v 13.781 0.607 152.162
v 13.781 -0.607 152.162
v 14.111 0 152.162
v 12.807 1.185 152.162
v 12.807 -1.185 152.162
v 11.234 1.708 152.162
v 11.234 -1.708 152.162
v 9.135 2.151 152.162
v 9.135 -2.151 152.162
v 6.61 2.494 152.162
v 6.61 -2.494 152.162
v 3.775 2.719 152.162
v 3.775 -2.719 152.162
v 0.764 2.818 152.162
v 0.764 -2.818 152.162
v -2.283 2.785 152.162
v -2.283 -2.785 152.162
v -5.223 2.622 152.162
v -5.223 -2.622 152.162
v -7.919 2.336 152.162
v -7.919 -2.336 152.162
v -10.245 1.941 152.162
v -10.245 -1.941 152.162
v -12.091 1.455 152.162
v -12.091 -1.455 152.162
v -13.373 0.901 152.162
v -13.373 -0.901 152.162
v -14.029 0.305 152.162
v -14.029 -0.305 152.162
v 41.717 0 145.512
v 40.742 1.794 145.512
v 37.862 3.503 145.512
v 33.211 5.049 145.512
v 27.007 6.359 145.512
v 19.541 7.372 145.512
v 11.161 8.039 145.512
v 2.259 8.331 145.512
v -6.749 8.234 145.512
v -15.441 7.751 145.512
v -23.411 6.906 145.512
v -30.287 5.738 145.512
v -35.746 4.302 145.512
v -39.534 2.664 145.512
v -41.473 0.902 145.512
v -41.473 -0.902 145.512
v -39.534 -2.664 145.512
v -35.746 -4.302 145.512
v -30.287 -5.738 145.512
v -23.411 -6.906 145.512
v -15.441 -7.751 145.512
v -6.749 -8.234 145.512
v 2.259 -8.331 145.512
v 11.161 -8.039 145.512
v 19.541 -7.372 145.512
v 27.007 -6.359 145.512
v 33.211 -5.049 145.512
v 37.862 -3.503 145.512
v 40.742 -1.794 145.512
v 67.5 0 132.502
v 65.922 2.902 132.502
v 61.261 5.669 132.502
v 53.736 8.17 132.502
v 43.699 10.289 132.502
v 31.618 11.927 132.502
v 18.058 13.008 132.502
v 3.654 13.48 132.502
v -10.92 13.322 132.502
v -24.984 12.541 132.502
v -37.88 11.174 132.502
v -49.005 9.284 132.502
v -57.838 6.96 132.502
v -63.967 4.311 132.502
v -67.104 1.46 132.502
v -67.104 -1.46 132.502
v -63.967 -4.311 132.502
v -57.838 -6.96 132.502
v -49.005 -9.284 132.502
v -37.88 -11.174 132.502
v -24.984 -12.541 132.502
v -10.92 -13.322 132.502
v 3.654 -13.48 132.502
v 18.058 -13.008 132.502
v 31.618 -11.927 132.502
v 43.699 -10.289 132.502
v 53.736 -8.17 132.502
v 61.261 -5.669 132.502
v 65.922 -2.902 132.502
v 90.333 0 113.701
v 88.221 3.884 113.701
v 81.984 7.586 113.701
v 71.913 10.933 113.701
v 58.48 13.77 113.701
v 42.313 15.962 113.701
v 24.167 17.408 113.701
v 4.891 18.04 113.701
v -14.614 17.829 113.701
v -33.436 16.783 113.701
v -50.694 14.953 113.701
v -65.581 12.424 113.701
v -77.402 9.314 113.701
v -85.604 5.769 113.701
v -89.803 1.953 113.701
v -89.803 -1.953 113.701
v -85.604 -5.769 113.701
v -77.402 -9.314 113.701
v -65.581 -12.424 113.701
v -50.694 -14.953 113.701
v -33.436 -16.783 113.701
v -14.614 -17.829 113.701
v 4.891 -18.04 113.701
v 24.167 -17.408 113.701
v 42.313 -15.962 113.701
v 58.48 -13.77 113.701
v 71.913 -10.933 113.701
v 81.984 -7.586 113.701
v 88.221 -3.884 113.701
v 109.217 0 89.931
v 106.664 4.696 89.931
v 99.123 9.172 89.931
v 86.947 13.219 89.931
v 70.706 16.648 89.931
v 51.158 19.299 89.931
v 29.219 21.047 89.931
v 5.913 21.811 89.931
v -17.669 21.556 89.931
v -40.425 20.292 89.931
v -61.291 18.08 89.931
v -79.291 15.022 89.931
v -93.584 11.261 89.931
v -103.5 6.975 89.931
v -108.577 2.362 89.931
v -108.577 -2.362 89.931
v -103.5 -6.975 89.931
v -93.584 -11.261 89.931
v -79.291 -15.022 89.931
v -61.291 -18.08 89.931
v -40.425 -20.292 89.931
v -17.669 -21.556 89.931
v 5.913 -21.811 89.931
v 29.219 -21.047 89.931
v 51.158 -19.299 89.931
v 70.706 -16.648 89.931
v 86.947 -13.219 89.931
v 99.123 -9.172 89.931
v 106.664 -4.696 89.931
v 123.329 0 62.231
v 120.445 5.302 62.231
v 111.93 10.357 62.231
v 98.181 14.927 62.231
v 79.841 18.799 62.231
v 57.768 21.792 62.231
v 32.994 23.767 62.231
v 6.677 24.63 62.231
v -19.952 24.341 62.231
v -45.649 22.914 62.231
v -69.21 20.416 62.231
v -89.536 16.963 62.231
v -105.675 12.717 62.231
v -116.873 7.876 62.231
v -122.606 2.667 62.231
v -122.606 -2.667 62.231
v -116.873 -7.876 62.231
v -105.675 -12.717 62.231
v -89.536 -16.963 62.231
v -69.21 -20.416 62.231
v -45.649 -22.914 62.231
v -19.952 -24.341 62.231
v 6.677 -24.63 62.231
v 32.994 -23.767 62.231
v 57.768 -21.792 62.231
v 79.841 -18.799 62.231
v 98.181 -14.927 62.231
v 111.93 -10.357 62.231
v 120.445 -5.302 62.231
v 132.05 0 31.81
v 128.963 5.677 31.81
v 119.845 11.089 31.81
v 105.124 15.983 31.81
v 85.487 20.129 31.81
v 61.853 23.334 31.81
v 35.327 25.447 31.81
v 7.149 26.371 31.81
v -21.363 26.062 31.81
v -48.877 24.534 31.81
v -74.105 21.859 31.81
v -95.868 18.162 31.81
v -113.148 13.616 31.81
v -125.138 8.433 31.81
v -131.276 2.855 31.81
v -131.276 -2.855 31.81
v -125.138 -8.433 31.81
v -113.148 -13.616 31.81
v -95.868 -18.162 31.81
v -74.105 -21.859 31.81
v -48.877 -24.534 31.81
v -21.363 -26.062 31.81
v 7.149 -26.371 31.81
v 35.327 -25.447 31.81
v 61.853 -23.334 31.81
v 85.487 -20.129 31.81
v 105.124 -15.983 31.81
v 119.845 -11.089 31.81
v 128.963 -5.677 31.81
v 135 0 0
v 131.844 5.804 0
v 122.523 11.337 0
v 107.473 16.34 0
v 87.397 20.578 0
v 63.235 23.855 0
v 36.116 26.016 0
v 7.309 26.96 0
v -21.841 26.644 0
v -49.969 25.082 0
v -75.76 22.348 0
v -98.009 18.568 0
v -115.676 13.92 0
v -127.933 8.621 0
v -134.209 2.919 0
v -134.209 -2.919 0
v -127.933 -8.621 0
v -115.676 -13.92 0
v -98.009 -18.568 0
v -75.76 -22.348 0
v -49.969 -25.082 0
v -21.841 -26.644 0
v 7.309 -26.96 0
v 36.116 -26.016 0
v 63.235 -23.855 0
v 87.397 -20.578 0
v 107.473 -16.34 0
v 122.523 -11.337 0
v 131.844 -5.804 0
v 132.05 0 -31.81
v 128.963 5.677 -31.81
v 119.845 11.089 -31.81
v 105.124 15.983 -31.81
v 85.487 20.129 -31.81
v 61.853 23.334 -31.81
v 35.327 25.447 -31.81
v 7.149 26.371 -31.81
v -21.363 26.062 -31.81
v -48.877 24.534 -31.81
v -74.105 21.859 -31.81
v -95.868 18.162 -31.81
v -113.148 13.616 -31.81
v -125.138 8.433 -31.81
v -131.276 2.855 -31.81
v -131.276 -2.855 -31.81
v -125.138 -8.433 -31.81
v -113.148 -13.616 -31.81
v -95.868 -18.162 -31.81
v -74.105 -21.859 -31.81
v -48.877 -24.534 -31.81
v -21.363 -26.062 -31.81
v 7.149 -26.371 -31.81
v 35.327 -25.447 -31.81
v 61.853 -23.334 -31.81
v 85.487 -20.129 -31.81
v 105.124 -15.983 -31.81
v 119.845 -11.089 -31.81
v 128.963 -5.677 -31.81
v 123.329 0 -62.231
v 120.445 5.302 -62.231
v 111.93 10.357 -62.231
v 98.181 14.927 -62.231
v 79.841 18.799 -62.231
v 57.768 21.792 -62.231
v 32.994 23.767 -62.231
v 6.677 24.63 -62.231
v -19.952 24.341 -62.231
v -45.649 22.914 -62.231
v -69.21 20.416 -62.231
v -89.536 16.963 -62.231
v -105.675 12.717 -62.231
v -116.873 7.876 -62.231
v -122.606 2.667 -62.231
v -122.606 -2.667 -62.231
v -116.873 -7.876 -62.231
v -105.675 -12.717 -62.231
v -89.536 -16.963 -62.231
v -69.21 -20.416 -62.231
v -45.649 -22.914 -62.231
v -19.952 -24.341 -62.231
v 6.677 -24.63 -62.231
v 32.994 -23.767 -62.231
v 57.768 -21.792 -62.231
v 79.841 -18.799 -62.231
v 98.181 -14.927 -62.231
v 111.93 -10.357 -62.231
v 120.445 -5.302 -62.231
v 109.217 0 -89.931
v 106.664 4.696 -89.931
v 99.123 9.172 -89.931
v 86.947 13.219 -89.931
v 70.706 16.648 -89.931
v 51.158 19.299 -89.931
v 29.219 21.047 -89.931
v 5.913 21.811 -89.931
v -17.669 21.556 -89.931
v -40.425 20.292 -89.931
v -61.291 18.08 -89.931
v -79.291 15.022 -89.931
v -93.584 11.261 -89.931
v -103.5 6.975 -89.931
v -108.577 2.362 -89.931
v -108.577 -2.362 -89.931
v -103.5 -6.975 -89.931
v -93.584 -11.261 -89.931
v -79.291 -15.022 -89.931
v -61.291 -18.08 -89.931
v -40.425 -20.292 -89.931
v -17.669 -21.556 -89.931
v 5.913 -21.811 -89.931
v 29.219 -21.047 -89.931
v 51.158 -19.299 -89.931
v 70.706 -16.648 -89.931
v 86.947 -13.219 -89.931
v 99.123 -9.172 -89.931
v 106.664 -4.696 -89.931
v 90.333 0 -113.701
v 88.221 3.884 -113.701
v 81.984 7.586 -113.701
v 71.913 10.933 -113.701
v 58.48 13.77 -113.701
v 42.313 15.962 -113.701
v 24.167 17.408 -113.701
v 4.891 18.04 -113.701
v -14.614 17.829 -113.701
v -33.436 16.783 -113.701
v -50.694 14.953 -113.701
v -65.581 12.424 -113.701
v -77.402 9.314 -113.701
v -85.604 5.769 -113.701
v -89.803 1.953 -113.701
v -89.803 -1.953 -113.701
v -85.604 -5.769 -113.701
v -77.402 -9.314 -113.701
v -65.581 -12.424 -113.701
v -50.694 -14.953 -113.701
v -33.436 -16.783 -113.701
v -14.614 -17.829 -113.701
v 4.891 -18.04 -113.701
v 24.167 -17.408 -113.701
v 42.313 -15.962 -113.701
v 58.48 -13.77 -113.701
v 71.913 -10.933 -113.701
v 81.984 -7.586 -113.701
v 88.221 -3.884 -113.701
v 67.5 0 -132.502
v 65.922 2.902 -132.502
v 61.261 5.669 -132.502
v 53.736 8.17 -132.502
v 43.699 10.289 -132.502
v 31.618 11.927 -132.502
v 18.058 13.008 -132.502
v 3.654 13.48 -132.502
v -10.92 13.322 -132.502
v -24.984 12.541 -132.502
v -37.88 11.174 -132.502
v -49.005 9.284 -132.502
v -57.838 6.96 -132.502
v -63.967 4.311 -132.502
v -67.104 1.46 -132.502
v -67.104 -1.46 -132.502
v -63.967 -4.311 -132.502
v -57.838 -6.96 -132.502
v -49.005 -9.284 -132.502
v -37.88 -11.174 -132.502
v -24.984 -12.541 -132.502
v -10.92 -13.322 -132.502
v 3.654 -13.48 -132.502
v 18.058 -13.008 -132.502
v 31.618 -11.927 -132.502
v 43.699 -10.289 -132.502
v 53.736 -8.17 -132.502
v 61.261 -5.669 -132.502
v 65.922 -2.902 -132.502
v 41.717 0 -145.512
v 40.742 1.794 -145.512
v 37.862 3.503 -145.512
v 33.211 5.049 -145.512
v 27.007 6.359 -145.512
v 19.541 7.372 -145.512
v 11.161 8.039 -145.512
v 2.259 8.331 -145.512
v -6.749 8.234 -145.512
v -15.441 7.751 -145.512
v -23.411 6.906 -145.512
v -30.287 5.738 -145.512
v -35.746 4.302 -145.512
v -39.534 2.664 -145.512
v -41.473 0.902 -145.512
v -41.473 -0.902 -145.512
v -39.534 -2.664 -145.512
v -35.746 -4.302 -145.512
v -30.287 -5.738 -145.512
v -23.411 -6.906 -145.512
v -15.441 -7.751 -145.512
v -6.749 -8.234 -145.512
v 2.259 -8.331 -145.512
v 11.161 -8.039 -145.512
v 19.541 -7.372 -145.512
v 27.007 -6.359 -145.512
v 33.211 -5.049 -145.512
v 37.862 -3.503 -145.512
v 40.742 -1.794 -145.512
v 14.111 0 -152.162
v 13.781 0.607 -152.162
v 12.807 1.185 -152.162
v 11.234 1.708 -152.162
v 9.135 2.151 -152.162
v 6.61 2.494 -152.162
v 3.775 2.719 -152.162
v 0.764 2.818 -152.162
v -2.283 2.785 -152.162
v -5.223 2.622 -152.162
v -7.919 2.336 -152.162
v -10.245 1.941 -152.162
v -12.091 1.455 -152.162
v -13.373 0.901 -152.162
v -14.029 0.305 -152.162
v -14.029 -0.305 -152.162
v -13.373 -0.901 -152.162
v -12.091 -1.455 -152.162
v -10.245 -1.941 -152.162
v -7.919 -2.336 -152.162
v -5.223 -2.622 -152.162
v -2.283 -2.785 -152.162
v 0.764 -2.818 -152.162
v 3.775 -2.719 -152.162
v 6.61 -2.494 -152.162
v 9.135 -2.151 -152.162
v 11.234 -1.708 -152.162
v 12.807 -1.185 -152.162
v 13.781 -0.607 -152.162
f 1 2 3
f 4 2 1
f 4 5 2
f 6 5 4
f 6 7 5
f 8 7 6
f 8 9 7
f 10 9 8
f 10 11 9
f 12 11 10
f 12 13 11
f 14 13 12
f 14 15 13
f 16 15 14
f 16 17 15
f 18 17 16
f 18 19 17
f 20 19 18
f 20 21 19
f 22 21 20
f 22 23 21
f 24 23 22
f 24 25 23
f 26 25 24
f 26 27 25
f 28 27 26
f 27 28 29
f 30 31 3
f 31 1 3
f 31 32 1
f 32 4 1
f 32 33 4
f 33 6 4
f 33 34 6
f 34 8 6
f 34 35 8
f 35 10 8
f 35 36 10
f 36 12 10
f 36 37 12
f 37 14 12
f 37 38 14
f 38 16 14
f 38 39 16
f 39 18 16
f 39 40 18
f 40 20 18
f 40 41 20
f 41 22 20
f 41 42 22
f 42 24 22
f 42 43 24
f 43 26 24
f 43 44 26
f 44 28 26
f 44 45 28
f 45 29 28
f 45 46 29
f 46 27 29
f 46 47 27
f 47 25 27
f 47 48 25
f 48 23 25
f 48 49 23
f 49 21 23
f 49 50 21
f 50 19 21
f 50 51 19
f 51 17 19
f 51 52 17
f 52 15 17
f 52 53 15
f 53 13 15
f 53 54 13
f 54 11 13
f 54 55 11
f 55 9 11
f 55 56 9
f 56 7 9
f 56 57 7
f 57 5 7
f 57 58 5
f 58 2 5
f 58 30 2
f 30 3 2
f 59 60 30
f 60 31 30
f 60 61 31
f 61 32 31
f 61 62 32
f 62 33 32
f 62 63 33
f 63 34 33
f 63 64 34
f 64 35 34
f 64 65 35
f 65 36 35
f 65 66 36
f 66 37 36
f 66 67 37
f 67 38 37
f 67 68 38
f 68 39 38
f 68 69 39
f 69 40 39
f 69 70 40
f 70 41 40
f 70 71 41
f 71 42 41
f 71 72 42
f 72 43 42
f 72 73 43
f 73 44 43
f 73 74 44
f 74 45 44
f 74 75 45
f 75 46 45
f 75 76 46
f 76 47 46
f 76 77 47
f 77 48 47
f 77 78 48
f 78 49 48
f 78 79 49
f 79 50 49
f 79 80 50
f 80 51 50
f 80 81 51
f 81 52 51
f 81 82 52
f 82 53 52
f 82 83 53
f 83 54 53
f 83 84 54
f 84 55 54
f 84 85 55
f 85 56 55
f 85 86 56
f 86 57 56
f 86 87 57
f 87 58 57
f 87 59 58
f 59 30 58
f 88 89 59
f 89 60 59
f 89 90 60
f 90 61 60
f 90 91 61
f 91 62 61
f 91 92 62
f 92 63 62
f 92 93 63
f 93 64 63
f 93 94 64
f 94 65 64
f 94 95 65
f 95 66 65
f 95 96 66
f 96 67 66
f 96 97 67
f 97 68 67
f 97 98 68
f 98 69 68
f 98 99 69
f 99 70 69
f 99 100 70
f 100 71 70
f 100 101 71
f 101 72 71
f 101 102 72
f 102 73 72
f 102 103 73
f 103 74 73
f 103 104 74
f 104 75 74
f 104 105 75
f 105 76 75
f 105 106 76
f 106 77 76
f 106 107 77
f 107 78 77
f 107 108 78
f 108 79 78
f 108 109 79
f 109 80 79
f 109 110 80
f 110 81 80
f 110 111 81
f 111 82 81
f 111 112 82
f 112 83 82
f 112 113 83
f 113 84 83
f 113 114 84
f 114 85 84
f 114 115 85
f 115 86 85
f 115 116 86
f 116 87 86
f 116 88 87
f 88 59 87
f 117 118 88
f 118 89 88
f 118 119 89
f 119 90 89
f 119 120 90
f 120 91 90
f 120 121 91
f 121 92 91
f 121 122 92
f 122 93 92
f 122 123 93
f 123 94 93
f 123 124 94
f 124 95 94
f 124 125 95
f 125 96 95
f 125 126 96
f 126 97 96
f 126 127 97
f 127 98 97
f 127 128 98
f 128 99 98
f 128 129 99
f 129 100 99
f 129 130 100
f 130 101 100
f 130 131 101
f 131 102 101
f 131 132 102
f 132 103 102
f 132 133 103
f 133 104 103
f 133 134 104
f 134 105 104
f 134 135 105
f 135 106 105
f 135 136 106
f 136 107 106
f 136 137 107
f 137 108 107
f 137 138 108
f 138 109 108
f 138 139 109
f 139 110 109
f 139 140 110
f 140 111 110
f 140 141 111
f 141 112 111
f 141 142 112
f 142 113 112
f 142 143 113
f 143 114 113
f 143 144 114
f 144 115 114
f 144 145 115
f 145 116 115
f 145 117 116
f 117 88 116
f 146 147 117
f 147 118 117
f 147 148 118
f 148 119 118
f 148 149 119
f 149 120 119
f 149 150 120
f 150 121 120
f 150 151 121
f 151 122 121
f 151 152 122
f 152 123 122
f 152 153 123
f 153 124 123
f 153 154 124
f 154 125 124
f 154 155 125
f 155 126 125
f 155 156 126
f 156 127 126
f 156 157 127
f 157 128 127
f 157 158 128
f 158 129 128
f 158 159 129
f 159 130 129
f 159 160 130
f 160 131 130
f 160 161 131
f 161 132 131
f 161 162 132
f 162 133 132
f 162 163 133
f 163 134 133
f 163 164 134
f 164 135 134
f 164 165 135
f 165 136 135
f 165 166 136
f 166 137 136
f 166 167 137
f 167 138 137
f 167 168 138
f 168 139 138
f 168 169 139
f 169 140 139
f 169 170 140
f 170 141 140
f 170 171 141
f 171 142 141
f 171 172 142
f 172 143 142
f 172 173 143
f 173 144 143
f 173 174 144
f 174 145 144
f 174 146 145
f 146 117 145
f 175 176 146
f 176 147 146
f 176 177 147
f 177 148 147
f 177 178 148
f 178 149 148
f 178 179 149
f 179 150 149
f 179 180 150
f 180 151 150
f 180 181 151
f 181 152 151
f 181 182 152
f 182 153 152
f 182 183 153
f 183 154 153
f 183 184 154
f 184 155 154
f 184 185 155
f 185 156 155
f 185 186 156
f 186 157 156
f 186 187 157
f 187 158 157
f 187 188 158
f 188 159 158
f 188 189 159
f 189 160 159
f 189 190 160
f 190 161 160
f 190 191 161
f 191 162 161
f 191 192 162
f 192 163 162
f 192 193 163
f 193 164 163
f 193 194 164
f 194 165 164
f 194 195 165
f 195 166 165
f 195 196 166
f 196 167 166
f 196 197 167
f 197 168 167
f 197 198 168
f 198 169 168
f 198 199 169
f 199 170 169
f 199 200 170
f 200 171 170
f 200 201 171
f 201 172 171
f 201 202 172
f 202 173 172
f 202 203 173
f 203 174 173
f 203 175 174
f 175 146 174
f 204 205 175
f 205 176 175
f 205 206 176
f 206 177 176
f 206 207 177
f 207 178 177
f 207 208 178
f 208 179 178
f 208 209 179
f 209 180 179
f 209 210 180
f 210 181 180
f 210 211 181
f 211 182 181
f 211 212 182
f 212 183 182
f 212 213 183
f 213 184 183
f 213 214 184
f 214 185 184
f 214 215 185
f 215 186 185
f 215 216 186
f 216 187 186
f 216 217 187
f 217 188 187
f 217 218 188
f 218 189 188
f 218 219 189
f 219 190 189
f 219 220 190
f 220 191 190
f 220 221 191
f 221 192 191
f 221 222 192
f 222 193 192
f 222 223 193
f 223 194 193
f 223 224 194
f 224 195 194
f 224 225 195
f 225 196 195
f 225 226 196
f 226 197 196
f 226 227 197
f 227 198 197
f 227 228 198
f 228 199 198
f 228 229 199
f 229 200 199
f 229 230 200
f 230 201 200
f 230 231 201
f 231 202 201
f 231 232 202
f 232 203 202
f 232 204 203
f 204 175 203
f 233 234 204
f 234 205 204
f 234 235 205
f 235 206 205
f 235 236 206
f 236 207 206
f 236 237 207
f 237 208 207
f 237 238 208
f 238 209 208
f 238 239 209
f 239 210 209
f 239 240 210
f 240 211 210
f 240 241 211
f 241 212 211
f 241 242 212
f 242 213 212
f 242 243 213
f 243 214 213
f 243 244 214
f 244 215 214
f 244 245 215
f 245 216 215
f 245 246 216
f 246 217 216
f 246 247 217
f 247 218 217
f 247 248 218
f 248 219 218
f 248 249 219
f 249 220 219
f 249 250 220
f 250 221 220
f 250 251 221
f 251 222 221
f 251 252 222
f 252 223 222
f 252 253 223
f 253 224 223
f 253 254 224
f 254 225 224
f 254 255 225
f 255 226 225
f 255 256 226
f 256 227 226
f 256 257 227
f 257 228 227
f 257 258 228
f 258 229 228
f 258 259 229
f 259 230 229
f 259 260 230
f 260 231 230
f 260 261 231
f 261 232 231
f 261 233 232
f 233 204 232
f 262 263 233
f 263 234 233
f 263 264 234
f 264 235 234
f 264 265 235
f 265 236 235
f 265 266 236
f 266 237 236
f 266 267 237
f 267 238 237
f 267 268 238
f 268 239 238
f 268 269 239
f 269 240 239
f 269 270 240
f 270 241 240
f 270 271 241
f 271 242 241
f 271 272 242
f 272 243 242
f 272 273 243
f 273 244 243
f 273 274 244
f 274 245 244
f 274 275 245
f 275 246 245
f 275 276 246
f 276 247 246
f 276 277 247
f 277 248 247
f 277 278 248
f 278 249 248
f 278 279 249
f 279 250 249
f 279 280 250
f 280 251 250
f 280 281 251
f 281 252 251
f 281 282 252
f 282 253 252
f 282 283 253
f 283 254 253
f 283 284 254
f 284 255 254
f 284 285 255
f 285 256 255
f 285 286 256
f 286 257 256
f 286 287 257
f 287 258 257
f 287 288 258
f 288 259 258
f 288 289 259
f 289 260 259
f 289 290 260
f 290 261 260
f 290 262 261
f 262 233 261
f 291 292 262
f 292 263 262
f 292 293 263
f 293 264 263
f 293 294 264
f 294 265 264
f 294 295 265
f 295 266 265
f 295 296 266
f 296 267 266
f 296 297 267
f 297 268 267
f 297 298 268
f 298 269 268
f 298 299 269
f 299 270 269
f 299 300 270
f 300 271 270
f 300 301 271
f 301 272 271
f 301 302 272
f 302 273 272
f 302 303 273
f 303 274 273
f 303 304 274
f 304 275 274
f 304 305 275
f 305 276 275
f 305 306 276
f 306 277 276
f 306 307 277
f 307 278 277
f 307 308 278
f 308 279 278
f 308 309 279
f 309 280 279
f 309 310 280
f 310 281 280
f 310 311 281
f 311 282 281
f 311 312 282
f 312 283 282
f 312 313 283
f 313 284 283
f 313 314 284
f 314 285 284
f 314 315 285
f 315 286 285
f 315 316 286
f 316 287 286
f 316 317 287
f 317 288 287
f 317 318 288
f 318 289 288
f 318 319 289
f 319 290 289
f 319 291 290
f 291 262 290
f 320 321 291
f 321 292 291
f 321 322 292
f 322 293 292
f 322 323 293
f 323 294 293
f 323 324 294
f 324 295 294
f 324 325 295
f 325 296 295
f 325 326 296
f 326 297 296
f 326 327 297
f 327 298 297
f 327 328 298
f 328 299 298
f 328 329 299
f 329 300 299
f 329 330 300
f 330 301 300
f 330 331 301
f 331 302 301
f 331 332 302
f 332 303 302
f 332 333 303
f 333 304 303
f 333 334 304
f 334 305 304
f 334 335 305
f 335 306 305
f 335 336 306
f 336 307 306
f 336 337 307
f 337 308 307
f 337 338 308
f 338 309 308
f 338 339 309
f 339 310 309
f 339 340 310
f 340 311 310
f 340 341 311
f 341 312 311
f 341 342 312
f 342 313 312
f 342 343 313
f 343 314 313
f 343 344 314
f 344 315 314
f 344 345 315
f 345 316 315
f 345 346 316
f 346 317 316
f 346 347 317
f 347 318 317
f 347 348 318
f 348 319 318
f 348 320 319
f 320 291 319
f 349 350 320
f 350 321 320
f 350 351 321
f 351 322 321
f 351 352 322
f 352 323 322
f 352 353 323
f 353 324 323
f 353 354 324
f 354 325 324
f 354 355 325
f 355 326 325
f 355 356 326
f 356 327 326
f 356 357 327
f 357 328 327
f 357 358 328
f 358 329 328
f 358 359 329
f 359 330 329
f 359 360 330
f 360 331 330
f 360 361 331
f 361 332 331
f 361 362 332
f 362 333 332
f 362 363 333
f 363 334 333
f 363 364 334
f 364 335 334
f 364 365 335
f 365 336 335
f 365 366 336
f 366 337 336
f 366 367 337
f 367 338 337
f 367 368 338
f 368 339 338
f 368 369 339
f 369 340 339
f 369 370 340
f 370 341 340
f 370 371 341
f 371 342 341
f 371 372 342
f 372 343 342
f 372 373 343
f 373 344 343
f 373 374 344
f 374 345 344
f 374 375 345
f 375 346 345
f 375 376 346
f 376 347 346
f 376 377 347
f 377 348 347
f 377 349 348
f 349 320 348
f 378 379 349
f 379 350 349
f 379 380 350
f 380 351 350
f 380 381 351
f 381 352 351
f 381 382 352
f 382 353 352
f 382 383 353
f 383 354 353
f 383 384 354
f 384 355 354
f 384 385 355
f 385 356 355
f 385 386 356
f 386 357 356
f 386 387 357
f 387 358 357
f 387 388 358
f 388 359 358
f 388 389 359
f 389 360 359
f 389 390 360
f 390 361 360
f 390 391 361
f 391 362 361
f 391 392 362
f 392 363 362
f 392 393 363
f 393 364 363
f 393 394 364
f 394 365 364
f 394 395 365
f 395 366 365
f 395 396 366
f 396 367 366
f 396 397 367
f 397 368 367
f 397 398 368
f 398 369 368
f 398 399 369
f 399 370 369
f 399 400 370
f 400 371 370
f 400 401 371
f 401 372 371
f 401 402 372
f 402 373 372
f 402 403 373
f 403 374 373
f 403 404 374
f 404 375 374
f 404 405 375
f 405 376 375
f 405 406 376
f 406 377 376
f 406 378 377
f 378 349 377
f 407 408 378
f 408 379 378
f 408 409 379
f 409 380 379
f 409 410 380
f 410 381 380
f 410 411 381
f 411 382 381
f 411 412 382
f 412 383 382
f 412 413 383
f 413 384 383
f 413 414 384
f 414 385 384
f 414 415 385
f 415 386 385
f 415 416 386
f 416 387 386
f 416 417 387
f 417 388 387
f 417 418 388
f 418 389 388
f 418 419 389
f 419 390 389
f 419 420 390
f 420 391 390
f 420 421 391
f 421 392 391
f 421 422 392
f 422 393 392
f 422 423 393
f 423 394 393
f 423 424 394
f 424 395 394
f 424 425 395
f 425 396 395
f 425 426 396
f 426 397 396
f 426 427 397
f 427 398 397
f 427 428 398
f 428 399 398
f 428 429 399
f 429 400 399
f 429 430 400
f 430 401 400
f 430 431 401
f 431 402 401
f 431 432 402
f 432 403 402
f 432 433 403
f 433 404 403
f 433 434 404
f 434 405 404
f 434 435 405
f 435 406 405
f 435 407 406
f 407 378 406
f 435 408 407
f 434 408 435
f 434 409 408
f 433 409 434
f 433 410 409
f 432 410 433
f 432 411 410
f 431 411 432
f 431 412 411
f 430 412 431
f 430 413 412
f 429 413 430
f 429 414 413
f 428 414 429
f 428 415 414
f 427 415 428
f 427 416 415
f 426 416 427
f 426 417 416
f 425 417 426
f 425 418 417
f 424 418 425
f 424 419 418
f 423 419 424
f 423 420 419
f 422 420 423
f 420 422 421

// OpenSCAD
// Generated by SolidPython 1.0.1 on 2020-07-29 00:46:51


scale(v = [15, 3, 17]) {
	sphere(r = 9);
}
/***********************************************
*********      SolidPython code:      **********
************************************************
 
# import packages: SolidPython
from solid import *
from solid.utils import *
from itertools import chain, combinations, permutations


class Resize:

    def __init__(self, scad_file):
        self.scad_file = scad_file
        #self.scad_file = import_scad(scad_file)
        # cone/cylinder param:
        self.r1 = 0
        self.r2 = 0
        self.h = 0
        # rectangular prism param:
        self.w = 0
        self.l = 0
        # ellipse param:
        self.r = 0

    # import OpenScad code (file name corresponds to shape)


    # classify shape + parameters
    def assign(self, param1, param2, param3):
        if self.scad_file == 'cone.scad':
            self.r1 = param1
            self.r2 = param2
            self.h = param3
        elif self.scad_file == 'cylinder.scad':
            self.r1 = param1
            self.r2 = param2
            self.h = param3
        elif self.scad_file == 'rectangularPrism.scad':
            self.h = param1
            self.l = param2
            self.w = param3
        else:
            self.r = param1
            self.h = param2

    # resize parameters
    def iterate(self):
        x = range(3, 20, 2)
        i = 1
        if self.scad_file == 'cone.scad':
            tempList = list(permutations(x, 2))
            for temp in tempList:
                param1 = temp[0]
                param2 = temp[1]
                filepath = 'produced_scad_files/' + 'cone' + str(param1) + '_' + str(param2) + '_' + '.scad'
                scad_render_to_file(cylinder(h=param1, r1=param2, r2=0), filepath)

        elif self.scad_file == 'cylinder.scad':
            tempList = list(permutations(x, 3))
            for temp in tempList:
                param1 = temp[0]
                param2 = temp[1]
                filepath = 'produced_scad_files/' + 'cylinder' + str(param1) + '_' + str(param2) + '_' + '.scad'
                scad_render_to_file(cylinder(h=param1, r1=param2, r2=param2), filepath)

        elif self.scad_file == 'rectangularPrism.scad':
            tempList = list(permutations(x, 3))
            for temp in tempList:
                param1 = temp[0]
                param2 = temp[1]
                param3 = temp[2]
                filepath = 'produced_scad_files/' + 'rectangularPrism' + str(param1) + '_' + str(param2) + '_' + str(
                    param3) + '.scad'
                scad_render_to_file(cube(size=(param1, param2, param3)), filepath)

        elif self.scad_file == 'ellipse.scad':
            tempList = list(permutations(x, 4))
            for temp in tempList:
                param1 = temp[0]
                param2 = temp[1]
                param3 = temp[2]
                param4 = temp[3]
                filepath = 'produced_scad_files/' + 'ellipse' + str(param1) + '_' + str(param2) + '_' + str(param3) + '_' + str(param4) + '.scad'
                scad_render_to_file(scale([param1, param2, param3])(sphere(r=param4)), filepath)

    def render_to_scadfile(self):
        scad_render_to_file(scad, 'example.scad') 
 
************************************************/
